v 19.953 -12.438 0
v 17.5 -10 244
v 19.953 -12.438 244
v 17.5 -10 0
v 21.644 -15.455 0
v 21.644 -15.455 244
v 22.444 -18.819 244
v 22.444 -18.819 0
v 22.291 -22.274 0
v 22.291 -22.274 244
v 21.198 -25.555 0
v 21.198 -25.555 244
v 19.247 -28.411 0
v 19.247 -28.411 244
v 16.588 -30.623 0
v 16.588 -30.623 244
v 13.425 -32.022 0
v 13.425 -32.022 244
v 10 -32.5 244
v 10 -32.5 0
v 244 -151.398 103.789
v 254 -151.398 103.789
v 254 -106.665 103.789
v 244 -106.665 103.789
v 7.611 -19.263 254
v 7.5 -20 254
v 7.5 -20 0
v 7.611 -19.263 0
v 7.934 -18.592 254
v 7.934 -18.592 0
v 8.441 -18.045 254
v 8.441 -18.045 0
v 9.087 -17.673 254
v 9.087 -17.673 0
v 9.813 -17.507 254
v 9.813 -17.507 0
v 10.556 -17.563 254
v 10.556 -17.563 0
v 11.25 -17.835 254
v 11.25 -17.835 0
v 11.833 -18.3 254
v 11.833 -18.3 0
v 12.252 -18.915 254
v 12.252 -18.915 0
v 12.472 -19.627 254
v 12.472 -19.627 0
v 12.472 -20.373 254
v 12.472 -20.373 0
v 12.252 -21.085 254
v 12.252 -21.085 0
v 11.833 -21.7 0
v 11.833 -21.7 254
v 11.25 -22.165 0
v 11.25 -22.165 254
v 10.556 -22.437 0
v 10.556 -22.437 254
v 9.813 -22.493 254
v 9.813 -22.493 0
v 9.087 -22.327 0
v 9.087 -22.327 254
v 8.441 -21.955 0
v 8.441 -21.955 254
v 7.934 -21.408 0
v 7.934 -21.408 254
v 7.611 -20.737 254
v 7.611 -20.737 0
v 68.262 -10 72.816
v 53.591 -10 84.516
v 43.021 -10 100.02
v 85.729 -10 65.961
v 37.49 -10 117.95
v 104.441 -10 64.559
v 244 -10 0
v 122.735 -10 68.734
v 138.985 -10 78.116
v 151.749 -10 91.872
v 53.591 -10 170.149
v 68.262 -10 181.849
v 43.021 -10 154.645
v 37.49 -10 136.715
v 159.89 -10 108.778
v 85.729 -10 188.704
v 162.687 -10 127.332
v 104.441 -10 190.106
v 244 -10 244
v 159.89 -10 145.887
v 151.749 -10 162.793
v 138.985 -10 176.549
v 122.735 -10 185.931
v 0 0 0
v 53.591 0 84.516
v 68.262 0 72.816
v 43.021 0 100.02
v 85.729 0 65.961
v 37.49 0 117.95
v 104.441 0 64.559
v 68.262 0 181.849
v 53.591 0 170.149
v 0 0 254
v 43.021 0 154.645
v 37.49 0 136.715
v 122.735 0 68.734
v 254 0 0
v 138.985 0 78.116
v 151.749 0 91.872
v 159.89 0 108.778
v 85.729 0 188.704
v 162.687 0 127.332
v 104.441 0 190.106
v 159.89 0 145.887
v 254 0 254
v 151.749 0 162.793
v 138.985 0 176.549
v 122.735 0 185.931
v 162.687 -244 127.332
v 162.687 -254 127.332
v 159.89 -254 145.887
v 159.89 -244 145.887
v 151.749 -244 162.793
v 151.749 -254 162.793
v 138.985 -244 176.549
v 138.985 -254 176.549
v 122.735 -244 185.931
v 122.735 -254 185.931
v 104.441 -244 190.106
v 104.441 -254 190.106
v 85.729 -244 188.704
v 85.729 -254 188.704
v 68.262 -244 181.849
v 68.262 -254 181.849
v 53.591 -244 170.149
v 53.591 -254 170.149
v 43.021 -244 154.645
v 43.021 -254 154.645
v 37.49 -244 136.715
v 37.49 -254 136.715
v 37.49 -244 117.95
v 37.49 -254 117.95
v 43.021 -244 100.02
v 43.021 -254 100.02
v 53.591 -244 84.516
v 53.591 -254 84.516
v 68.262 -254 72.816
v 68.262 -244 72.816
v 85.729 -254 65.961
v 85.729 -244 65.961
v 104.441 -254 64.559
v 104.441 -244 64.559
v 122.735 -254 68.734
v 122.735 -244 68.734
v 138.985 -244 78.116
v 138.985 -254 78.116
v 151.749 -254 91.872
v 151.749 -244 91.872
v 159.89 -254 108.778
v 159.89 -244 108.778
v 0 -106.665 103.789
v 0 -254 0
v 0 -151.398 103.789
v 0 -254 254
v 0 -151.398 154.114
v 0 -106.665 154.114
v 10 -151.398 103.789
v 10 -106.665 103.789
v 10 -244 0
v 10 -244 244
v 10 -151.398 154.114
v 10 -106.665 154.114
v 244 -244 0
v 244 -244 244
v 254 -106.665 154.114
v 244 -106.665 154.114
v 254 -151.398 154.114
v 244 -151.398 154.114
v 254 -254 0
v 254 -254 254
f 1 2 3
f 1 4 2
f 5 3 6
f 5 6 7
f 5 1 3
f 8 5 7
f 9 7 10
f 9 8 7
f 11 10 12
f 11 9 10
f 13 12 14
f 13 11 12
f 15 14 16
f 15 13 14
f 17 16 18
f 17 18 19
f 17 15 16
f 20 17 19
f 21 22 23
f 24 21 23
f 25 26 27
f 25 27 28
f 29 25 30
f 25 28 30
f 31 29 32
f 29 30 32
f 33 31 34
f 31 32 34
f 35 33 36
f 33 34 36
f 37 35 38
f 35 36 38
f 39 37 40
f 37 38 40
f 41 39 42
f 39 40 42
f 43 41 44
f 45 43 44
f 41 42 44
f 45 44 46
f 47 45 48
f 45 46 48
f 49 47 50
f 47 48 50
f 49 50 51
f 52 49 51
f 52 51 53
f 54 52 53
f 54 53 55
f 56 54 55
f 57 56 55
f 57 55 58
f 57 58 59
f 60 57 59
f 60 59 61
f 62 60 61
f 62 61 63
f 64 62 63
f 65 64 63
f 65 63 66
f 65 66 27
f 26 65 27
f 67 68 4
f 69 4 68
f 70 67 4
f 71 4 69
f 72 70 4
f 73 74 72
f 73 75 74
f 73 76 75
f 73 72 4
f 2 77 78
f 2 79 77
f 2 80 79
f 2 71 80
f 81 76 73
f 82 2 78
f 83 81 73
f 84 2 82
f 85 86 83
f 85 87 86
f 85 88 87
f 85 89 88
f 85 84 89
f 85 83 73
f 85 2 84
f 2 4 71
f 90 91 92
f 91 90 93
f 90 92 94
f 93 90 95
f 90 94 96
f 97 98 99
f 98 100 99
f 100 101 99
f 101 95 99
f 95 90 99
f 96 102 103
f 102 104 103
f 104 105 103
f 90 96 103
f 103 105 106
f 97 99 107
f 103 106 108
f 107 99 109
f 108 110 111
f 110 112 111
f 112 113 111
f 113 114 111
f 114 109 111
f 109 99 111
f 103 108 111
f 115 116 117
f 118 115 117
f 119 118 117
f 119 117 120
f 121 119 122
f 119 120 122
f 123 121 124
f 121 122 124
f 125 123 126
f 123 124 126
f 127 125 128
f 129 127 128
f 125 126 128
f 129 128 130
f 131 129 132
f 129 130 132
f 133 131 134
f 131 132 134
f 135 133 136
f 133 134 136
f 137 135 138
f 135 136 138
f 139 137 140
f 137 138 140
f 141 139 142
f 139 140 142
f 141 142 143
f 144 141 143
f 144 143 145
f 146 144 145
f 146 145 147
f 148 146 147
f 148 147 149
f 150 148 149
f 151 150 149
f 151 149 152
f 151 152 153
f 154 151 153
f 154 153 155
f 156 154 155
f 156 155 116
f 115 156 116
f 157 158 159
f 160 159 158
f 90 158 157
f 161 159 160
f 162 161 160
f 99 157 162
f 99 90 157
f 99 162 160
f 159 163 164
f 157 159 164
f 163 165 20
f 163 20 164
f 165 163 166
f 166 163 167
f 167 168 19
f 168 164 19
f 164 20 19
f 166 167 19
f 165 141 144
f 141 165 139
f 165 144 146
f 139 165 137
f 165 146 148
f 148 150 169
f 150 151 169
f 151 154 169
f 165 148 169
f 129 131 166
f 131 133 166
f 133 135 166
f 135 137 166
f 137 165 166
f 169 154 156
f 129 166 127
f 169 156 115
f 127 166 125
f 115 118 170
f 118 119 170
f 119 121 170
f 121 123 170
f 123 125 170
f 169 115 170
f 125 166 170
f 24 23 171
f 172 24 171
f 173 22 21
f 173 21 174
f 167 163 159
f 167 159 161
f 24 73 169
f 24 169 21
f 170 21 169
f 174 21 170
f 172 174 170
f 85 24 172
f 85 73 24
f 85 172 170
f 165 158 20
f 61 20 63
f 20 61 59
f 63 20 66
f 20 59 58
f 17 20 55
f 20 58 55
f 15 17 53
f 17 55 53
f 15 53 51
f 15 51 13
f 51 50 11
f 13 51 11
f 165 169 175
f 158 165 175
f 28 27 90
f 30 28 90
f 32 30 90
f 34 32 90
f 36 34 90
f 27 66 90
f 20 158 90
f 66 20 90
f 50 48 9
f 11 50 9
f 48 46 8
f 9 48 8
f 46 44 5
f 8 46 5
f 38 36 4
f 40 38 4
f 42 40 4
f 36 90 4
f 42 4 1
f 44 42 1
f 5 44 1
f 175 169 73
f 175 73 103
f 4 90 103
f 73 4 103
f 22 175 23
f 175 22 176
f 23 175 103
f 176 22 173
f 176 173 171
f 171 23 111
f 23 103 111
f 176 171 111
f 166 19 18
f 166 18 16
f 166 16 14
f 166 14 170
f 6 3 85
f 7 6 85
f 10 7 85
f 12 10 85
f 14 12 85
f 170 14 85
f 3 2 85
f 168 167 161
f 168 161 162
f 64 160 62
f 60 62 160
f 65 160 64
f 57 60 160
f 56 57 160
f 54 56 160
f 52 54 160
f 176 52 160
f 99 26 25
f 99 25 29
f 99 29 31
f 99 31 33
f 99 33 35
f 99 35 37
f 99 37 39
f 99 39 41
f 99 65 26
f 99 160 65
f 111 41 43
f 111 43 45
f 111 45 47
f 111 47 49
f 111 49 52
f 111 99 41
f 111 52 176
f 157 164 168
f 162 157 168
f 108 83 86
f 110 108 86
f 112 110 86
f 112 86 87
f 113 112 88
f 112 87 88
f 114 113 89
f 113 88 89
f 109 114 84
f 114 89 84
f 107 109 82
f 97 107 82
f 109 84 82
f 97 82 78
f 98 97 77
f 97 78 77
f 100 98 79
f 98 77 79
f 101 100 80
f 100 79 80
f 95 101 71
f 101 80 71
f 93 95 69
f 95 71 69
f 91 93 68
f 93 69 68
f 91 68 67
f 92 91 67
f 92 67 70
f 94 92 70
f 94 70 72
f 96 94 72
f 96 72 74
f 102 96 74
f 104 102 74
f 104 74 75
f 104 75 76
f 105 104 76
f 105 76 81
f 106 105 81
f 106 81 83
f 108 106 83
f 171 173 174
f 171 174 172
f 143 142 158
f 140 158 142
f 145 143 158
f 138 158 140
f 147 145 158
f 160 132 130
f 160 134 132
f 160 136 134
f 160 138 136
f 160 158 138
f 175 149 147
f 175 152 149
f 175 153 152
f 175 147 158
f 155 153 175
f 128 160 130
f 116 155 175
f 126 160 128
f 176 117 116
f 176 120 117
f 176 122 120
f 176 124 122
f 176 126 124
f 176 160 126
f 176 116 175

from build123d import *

# Parameters (mm, degrees)
F0_W     = 254
F0_H     = 254
F1_DEPTH = 254
F3_D     = 5
F4_T     = -10
F5_R     = 62.949933
F6_DEPTH = 254.001
F7_W     = 44.732734
F7_H     = 50.324321
F8_DEPTH = 254.001


with BuildPart() as f1:
    # F0 (on Front) → F1 (new body)
    with BuildSketch(Plane.XZ):
        with Locations((127, 127)):
            Rectangle(F0_W, F0_H)
    extrude(amount=F1_DEPTH)

    # F3 (through all)
    with Locations(Plane.XY.offset(254)):
        with Locations((10, -20)):
            Hole(F3_D / 2)

    # F4
    f4_openings = [f1.faces().sort_by_distance(p)[0] for p in [
        (127.035619, -127.032575, 0),
    ]]
    offset(amount=F4_T, openings=f4_openings)

    # F5 (on face) → F6 (cut, through all)
    with BuildSketch(Plane.XZ.offset(254)):
        with Locations((99.736825, 127.332494)):
            Circle(F5_R)
    extrude(amount=-F6_DEPTH, mode=Mode.SUBTRACT)

    # F7 (on face) → F8 (cut, through all)
    with BuildSketch(Plane.YZ.offset(254)):
        with Locations((-129.031144, 128.951653)):
            Rectangle(F7_W, F7_H)
    extrude(amount=-F8_DEPTH, mode=Mode.SUBTRACT)


solid = f1.part
